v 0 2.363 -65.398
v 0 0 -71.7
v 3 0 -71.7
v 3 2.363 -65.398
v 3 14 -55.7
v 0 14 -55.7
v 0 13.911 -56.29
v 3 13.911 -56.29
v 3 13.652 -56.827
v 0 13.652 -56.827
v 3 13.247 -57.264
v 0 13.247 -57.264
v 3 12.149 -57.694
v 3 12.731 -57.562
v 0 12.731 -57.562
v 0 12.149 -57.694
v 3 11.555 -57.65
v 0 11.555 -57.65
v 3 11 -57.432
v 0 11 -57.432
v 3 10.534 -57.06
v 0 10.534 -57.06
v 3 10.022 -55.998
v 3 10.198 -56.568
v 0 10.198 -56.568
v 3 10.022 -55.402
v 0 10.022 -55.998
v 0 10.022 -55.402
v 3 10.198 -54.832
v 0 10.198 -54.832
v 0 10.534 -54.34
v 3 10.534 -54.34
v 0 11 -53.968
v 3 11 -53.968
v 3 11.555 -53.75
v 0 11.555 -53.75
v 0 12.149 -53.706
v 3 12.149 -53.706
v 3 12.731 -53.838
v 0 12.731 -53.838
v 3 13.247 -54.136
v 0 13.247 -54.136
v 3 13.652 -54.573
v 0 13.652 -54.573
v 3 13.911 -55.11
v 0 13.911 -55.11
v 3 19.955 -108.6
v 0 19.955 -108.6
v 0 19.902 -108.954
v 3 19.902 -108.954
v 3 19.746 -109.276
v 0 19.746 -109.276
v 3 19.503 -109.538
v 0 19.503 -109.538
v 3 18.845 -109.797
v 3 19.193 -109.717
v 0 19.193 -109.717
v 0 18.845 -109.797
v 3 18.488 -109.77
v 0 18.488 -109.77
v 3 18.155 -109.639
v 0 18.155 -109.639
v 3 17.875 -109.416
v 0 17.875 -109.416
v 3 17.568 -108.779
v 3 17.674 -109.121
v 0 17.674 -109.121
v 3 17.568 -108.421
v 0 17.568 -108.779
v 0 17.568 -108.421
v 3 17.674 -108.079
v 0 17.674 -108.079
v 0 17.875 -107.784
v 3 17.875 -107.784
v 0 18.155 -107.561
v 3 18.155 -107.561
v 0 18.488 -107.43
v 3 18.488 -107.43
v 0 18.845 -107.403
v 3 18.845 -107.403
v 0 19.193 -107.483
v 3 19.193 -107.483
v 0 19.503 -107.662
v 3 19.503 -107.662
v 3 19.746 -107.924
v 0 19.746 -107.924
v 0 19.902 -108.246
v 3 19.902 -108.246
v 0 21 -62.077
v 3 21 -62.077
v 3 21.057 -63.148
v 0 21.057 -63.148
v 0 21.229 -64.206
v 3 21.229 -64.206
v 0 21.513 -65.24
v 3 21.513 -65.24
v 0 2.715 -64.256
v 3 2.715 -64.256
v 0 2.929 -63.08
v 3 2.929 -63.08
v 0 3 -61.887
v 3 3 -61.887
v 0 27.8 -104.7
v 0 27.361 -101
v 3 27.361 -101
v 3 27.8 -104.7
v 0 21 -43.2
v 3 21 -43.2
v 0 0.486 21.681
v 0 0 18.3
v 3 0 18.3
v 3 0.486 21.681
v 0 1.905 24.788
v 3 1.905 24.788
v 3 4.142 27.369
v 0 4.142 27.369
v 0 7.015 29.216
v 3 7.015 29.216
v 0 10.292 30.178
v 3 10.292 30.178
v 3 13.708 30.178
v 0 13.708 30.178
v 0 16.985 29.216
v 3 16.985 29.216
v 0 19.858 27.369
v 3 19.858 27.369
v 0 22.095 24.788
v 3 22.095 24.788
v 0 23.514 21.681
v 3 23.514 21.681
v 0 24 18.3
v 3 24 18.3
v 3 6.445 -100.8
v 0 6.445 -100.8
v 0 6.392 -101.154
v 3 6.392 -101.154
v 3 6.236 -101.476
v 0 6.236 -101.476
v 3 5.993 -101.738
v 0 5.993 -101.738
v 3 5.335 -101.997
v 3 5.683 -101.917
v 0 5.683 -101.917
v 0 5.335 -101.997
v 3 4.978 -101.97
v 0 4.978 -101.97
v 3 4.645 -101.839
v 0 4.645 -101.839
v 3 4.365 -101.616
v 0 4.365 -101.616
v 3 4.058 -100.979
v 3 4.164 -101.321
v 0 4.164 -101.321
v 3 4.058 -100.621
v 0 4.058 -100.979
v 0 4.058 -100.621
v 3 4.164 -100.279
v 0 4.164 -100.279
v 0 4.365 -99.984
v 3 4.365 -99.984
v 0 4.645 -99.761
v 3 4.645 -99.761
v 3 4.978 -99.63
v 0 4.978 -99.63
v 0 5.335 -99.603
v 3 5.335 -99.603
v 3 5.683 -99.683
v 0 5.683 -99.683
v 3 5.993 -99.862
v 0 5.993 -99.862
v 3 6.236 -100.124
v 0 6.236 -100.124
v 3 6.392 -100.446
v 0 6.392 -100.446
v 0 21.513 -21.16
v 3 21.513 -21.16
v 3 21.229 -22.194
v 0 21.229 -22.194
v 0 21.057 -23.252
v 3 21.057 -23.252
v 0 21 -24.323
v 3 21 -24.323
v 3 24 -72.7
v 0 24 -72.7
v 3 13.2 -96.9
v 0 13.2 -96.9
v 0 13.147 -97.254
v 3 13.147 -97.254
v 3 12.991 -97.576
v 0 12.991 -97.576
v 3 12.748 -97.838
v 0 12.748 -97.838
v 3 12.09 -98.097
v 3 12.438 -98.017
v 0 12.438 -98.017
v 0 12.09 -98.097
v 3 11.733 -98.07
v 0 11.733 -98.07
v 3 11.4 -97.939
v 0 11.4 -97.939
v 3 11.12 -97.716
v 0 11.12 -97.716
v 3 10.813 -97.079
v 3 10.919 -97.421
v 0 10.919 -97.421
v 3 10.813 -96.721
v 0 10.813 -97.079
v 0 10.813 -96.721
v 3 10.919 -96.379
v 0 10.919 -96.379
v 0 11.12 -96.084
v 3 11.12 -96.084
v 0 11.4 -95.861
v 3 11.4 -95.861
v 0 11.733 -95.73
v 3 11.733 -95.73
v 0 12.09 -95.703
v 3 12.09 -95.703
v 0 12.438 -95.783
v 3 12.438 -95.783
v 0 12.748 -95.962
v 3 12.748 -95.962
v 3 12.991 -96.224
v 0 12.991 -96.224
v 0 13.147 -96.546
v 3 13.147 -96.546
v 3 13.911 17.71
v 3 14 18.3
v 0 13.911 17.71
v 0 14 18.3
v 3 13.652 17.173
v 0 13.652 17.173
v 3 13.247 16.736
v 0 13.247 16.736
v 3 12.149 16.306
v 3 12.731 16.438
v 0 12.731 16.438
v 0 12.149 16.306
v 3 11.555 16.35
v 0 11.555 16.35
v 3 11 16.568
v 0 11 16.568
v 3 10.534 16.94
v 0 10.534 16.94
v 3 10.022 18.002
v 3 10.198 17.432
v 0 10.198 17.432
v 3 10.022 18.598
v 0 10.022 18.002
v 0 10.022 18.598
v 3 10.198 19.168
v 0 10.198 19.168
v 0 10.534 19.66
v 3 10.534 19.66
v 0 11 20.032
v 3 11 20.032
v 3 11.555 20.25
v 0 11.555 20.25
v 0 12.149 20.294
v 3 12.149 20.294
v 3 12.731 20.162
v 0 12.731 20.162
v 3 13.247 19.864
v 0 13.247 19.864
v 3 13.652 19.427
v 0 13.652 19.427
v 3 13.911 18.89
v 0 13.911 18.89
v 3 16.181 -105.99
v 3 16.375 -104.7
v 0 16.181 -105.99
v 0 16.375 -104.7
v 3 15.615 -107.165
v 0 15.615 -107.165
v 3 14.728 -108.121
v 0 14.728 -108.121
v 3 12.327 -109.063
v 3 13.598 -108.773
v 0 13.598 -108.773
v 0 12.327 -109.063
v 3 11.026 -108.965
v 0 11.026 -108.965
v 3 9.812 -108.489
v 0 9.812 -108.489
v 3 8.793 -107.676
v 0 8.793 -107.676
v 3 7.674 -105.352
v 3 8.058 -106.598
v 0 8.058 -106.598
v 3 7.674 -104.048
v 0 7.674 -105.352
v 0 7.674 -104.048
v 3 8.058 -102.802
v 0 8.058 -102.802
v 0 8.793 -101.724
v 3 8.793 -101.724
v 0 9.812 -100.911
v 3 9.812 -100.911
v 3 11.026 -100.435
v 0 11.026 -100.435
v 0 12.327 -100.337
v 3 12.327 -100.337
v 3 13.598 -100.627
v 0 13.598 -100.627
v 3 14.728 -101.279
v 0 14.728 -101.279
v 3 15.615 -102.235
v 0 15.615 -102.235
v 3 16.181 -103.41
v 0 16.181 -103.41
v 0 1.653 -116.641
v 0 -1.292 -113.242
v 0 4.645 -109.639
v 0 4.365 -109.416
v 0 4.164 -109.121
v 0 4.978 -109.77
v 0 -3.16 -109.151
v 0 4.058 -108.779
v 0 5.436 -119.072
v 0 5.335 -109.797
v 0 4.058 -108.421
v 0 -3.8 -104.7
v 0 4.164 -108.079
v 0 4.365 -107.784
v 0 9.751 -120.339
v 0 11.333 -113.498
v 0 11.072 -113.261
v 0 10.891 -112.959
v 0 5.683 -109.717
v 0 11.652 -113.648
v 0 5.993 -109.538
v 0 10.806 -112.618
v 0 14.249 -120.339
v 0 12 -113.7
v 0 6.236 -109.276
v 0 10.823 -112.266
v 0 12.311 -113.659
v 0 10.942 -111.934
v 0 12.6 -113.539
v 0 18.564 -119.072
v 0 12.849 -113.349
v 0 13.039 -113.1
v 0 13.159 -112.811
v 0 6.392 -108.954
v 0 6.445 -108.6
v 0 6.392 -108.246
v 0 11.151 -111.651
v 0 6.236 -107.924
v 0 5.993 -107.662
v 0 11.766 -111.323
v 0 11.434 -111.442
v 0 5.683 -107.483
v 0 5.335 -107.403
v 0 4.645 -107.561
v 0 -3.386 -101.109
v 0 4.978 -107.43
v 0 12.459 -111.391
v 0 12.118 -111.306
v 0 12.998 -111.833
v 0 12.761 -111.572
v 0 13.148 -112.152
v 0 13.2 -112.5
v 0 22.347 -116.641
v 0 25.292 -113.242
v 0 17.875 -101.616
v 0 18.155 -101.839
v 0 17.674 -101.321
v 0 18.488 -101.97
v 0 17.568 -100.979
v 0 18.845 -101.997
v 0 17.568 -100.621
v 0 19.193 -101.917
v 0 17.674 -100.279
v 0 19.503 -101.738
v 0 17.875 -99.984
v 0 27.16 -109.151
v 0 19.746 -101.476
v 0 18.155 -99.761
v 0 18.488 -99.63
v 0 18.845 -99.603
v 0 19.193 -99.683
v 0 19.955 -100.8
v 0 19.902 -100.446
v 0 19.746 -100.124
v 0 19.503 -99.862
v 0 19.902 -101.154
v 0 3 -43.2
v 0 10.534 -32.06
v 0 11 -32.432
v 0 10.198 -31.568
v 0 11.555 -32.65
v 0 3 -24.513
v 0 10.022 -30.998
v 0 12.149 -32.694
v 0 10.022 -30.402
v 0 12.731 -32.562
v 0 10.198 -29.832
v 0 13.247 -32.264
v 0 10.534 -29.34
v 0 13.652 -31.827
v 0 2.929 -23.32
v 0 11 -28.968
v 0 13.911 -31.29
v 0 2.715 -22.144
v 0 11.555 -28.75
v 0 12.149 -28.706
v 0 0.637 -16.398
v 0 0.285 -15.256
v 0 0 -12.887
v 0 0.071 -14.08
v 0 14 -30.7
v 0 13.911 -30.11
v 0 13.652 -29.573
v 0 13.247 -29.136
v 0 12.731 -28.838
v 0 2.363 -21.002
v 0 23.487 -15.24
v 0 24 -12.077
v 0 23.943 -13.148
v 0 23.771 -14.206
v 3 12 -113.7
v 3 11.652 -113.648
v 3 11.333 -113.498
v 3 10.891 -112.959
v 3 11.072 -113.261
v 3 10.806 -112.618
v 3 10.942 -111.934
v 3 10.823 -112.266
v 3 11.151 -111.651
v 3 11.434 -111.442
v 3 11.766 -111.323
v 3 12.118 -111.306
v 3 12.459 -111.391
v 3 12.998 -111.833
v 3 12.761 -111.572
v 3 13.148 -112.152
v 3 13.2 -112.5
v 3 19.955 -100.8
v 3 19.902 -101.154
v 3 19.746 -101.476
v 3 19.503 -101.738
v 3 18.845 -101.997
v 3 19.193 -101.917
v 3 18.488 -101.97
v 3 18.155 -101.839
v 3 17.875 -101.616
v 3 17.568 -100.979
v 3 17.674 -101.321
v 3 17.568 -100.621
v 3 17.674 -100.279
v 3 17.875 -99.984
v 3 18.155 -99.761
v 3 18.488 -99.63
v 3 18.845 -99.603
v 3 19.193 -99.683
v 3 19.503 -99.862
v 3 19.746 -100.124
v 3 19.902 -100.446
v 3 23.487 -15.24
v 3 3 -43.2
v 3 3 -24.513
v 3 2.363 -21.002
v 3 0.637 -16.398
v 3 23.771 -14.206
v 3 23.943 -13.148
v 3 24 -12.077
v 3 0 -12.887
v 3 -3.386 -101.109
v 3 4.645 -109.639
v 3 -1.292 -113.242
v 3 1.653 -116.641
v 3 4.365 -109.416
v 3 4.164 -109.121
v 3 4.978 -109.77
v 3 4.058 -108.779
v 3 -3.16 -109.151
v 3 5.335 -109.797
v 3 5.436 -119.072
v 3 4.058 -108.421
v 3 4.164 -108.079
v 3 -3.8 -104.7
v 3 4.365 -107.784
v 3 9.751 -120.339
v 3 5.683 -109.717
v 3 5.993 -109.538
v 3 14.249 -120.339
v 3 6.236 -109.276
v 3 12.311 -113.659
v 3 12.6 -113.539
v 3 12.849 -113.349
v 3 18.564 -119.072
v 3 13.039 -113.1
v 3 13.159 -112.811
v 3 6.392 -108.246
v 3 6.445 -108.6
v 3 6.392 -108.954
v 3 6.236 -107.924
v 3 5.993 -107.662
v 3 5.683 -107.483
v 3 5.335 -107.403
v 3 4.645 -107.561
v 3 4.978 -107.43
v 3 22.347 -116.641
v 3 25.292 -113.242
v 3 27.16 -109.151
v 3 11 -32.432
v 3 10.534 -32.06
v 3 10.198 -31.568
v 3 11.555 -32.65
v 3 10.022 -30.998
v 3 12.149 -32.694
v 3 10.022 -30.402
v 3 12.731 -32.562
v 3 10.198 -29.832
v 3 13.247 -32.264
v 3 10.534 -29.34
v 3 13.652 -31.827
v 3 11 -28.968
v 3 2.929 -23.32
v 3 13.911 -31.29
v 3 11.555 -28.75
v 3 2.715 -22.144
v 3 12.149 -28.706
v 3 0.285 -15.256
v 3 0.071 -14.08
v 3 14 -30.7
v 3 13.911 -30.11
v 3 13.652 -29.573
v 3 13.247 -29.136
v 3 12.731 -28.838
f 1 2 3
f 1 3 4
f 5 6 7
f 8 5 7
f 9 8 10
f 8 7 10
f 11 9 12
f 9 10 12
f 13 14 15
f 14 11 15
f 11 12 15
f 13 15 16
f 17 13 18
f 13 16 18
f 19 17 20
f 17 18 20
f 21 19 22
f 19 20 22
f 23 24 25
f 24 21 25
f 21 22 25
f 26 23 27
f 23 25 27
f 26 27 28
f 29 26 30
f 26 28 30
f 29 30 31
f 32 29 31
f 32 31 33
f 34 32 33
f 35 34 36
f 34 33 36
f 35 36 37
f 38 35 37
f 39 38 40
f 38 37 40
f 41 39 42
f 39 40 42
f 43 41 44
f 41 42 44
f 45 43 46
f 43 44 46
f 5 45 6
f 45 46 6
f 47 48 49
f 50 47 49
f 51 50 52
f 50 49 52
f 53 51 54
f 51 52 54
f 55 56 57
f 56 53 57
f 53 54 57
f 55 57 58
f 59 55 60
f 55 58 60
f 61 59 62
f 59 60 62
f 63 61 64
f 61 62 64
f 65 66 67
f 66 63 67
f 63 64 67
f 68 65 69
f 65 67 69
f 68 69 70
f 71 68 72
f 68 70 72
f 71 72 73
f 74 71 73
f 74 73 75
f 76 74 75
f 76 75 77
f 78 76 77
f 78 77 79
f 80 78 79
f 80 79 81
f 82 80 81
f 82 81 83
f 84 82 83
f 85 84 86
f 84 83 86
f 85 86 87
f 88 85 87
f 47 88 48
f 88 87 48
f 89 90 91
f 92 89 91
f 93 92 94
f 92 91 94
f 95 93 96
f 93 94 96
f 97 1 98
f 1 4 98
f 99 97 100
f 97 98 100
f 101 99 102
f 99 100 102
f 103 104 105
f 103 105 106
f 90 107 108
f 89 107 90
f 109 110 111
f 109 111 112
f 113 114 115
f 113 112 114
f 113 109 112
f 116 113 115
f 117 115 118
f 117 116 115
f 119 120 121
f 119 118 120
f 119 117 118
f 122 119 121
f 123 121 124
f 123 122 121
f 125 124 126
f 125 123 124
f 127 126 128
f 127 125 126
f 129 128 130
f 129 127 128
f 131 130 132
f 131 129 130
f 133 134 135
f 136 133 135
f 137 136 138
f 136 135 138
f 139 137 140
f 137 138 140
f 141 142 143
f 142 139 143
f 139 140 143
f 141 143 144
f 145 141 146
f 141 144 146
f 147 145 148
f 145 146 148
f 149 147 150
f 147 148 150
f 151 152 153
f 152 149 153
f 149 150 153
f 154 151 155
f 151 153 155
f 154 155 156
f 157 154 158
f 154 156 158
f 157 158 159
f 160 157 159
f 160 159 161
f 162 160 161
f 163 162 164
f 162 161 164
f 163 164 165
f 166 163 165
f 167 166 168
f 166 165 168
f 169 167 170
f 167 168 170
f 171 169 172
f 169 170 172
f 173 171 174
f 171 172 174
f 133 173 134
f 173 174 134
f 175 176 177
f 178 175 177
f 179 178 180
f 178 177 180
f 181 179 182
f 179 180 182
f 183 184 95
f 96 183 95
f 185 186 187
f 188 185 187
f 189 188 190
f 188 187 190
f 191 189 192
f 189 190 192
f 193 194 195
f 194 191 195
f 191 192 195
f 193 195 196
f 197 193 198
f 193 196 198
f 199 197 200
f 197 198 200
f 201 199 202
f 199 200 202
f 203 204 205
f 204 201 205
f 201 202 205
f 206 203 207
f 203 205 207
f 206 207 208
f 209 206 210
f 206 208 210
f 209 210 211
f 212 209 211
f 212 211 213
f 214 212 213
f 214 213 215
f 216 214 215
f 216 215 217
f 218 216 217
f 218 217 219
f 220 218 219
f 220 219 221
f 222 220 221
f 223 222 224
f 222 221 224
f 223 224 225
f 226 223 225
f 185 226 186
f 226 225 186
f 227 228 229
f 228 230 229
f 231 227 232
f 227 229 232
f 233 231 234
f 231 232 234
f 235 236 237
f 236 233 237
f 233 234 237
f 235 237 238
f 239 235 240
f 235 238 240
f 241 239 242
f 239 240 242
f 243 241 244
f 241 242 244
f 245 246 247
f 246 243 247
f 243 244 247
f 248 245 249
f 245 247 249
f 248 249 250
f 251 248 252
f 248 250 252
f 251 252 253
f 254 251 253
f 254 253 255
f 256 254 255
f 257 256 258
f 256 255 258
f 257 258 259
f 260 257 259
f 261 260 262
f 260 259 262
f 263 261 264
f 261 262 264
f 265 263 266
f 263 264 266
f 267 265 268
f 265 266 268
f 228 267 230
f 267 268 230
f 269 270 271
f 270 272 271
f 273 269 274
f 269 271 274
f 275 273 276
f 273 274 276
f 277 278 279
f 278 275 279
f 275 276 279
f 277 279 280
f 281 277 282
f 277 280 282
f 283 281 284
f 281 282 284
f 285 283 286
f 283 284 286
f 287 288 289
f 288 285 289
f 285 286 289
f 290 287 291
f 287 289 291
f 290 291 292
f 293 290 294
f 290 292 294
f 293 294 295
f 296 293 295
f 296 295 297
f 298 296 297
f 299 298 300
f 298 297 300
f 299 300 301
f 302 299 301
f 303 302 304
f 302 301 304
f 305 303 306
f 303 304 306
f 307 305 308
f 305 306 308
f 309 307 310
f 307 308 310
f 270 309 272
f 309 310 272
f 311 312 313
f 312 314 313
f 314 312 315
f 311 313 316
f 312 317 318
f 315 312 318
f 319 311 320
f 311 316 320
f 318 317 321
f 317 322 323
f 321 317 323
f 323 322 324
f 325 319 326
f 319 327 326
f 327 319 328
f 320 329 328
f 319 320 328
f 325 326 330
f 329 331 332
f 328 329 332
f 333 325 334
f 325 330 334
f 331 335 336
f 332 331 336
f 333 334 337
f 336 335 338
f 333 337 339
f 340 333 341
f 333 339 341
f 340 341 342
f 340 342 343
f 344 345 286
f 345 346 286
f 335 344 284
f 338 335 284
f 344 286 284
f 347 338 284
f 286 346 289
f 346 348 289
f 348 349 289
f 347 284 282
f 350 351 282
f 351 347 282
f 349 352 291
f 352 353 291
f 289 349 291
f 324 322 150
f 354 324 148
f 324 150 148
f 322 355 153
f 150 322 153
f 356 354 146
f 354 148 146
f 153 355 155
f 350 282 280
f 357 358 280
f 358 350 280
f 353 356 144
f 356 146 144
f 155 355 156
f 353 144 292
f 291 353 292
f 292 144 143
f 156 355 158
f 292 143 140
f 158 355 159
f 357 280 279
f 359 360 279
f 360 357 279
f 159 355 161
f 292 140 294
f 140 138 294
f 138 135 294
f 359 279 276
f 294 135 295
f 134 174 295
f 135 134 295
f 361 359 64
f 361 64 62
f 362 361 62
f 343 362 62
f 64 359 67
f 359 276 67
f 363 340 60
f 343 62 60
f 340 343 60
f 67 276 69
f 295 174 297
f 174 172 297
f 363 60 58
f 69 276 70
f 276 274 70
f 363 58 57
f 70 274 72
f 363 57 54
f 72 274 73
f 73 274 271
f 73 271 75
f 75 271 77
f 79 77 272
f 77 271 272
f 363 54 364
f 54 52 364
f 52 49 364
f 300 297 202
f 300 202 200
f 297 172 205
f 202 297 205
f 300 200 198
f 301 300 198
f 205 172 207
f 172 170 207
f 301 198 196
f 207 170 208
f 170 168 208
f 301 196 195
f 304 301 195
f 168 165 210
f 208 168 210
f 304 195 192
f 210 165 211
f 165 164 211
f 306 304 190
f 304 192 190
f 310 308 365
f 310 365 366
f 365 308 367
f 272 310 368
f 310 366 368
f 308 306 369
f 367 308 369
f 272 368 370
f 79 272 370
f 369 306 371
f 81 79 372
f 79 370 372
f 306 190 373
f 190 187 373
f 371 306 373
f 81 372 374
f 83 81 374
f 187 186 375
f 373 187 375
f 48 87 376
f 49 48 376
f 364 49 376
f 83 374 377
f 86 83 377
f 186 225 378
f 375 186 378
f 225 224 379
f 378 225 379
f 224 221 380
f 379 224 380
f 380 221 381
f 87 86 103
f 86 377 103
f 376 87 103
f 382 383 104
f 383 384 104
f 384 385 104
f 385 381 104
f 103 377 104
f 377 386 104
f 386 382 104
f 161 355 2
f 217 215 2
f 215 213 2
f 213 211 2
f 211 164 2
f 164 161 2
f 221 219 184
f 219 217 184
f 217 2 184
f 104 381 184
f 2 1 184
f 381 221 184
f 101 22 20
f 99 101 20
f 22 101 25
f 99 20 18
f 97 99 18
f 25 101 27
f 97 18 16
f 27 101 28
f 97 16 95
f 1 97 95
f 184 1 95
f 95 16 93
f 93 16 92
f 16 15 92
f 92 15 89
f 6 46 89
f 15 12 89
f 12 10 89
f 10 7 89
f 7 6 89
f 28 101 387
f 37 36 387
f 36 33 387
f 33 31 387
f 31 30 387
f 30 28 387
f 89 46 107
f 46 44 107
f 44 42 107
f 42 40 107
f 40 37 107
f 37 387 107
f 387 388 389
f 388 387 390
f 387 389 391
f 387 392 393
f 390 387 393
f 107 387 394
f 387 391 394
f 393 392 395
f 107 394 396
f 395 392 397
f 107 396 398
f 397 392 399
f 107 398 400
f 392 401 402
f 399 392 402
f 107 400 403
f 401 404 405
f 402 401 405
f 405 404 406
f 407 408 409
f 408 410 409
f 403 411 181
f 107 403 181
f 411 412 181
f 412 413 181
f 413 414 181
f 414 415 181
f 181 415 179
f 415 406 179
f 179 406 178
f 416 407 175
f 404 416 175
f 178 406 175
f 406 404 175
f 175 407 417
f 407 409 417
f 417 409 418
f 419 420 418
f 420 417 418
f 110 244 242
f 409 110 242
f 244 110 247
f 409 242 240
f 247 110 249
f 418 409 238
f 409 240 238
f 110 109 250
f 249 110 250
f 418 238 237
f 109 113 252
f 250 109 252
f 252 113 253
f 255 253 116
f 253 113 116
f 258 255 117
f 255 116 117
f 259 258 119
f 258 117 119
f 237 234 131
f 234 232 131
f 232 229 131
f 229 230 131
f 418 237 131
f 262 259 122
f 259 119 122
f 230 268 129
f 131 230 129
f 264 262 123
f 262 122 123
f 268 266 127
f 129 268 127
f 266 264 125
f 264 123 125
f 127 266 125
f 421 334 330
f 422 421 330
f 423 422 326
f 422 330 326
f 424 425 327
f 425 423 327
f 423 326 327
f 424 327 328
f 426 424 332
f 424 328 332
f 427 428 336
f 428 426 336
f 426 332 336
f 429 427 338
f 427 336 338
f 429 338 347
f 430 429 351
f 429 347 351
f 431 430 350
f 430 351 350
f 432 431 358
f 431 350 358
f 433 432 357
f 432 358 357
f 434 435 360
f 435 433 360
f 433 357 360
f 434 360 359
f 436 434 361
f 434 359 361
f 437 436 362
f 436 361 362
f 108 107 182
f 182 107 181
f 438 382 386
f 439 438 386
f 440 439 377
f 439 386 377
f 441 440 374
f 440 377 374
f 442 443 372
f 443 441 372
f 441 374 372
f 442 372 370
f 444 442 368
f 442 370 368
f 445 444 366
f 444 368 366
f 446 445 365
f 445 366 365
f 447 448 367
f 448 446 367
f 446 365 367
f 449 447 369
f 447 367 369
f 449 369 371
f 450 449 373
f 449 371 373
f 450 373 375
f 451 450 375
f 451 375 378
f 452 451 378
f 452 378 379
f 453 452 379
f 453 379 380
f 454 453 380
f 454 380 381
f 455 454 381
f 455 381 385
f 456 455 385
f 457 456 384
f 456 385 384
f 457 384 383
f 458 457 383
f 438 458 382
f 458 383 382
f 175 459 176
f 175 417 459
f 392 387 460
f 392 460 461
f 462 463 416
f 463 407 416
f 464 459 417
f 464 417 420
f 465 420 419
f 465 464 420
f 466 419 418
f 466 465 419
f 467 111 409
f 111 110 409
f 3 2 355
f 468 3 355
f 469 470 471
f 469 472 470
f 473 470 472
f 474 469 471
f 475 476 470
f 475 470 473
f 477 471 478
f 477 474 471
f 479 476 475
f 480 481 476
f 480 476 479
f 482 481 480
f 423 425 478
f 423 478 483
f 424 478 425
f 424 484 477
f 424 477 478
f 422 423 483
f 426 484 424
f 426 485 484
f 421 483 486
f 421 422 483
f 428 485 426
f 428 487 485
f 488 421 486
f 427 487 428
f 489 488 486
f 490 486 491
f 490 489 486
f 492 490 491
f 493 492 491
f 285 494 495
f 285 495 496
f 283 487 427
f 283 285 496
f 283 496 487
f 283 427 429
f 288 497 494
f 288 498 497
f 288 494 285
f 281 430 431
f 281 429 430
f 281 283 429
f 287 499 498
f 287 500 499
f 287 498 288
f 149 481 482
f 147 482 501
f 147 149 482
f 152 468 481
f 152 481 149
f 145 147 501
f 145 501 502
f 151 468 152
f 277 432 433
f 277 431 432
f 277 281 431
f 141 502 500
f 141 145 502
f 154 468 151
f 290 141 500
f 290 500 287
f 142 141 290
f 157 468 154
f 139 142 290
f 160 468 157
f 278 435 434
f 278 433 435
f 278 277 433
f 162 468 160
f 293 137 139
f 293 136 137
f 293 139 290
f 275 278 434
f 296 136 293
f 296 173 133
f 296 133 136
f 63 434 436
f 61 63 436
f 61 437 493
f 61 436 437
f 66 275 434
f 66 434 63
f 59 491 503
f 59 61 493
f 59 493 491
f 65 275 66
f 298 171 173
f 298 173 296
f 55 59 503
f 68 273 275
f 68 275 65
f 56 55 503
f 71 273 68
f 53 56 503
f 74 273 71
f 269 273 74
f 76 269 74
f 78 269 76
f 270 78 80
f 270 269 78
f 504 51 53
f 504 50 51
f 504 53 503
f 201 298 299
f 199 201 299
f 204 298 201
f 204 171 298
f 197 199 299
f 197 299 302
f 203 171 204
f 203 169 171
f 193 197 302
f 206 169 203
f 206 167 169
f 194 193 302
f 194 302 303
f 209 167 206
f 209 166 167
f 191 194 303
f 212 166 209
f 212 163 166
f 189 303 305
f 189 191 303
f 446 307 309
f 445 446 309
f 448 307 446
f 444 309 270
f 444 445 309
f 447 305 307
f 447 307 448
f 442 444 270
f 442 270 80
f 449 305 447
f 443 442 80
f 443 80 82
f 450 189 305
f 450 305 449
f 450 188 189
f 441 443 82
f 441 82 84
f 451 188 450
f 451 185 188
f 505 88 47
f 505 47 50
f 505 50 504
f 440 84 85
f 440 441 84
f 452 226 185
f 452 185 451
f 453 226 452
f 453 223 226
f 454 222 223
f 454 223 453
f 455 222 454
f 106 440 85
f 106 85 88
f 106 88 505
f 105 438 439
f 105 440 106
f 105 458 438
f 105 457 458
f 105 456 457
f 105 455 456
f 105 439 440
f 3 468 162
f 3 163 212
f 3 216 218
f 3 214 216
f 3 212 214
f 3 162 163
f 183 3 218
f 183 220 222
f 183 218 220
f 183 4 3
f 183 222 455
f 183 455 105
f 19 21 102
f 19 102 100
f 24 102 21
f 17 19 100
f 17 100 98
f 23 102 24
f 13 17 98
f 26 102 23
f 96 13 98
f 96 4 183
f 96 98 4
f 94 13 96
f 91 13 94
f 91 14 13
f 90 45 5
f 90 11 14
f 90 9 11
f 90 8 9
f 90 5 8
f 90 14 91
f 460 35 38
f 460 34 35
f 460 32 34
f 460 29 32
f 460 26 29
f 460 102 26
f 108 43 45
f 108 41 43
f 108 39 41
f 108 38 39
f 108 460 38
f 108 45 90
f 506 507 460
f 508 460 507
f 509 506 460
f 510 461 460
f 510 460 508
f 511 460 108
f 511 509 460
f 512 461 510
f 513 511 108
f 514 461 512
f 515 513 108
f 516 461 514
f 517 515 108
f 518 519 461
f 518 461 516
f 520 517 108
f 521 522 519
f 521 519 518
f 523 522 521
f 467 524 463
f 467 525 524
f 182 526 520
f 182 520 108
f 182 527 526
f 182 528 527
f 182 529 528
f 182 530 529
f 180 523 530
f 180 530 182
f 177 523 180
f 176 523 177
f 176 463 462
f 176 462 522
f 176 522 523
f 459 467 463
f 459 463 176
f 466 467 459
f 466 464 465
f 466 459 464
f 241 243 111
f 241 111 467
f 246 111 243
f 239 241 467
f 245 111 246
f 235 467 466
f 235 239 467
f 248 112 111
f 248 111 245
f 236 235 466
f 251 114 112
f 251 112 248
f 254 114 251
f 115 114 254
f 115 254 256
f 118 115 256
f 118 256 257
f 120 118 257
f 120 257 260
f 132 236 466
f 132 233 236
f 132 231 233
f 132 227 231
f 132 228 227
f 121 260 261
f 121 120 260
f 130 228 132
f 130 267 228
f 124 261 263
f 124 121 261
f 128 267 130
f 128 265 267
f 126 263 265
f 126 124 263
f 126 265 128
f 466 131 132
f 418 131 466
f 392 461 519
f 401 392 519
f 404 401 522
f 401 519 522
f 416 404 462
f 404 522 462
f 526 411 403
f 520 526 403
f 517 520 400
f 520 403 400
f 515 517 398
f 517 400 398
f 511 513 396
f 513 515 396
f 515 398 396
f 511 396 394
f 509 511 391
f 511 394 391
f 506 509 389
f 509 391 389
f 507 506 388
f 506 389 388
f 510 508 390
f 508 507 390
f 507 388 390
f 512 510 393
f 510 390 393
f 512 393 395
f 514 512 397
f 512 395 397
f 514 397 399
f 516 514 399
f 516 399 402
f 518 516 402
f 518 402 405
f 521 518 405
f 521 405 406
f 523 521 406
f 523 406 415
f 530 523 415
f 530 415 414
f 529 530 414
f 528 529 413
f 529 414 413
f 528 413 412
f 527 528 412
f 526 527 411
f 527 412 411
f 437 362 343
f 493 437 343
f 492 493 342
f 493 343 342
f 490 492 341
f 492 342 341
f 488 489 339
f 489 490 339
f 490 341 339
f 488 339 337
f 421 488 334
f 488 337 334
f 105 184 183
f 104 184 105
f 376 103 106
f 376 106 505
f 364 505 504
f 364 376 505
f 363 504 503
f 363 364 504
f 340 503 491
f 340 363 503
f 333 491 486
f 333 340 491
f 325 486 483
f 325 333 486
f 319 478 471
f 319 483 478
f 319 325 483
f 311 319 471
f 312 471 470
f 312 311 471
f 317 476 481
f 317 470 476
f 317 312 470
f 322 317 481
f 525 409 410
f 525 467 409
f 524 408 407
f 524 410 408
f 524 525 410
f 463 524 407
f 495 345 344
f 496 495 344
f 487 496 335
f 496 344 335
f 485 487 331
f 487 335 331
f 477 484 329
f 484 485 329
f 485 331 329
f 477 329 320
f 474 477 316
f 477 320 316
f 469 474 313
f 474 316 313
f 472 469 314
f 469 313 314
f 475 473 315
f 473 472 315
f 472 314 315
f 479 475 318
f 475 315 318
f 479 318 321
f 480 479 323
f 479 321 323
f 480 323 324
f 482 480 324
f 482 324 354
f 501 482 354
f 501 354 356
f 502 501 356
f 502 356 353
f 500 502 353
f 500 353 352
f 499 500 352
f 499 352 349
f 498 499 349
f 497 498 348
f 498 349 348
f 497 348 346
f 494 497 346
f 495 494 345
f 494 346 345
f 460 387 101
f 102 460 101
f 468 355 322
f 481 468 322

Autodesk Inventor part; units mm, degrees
ref_plane "YZ Plane" through (0, 0, 0) normal (1, 0, 0) x (0, 1, 0)
ref_plane "XZ Plane" through (0, 0, 0) normal (0, 1, 0) x (-1, 0, 0)
ref_plane "XY Plane" through (0, 0, 0) normal (0, 0, 1) x (1, 0, 0)
sketch "Sketch1" plane through (0, 0, 0) normal (1, 0, 0) x (0, 1, 0)
  circle A0 centre (12, -104.7) radius 4.375
  circle A1 centre (12, -104.7) radius 9 construction
  line L0 (12, -116.7) -> (12, -104.7) construction
  line L1 (12, -113.7) -> (12, -112.5)
  circle A2 centre (12, -112.5) radius 1.2
  circle A3 centre (12, -55.7) radius 2
  circle A4 centre (18.755, -108.6) radius 1.2
  circle A5 centre (18.755, -100.8) radius 1.2
  circle A6 centre (12, -96.9) radius 1.2
  circle A7 centre (5.245, -100.8) radius 1.2
  circle A8 centre (5.245, -108.6) radius 1.2
  line L2 (3, -43.2) -> (21, -43.2) construction
  line L3 (12, -116.7) -> (12, -71.7) construction
  line L4 (12, -71.7) -> (12, -63.7) construction
  line L5 (12, -63.7) -> (21, -63.7) construction
  line L6 (12, -63.7) -> (3, -63.7) construction
  line L7 (24, -72.7) -> (21, -63.7)
  line L8 (0, -71.7) -> (3, -63.7)
  line L9 (3, -43.2) -> (3, -63.7)
  line L10 (21, -43.2) -> (21, -63.7)
  arc A9 (24, 18.3) -> (0, 18.3) centre (12, 18.3) ccw
  circle A10 centre (12, -30.7) radius 2
  line L11 (12, -14.7) -> (12, -22.7) construction
  line L12 (12, -22.7) -> (21, -22.7) construction
  line L13 (12, -22.7) -> (3, -22.7) construction
  line L14 (24, -13.7) -> (21, -22.7)
  line L15 (0, -14.7) -> (3, -22.7)
  line L16 (3, -43.2) -> (3, -22.7)
  line L17 (0, 18.3) -> (0, -14.7)
  line L18 (24, 18.3) -> (24, -13.7)
  line L19 (21, -43.2) -> (21, -22.7)
  arc A11 (-3.3865, -101.1088) -> (27.3606, -100.9997) centre (12, -104.7) ccw
  line L20 (24, -72.7) -> (27.8, -104.7)
  line L21 (0, -71.7) -> (-3.8, -104.7)
  circle A12 centre (12, 18.3) radius 2
  point P0 (1.5, 26.1095)
  point P1 (22.5, 26.1095)
  point P2 (19.7942, -109.2)
  point P3 (19.7942, -100.2)
  point P4 (12, -95.7)
  point P5 (4.2058, -100.2)
  point P6 (4.2058, -109.2)
  dimension "d7" = 18
  dimension "d6" = 8.75
  dimension "d8" = 1.2
  dimension "d12" = 4
  dimension "d15" = 360
  dimension "d22" = 45
  dimension "d23" = 8
  dimension "d24" = 9
  dimension "d25" = 9
  dimension "d33" = 8
  dimension "d34" = 12.5
  dimension "d45" = 4
  dimension "d46" = 4
extrude "Extrusion2" add sketch "Sketch1" along normal blind 3 contours L20 A11 L21 L8 L9 L16 L15 L17 A9 L18 L14 L19 L10 L7
fillet "Face Fillet1" radius 10 1 edges at (1.5, 3, -22.7)
fillet "Face Fillet2" radius 10 1 edges at (1.5, 0, -14.7)
fillet "Face Fillet3" radius 10 1 edges at (1.5, 3, -63.7)
fillet "Face Fillet5" radius 10 1 edges at (1.5, 24, -13.7)
fillet "Face Fillet6" radius 10 1 edges at (1.5, 21, -22.7)
fillet "Face Fillet7" radius 10 1 edges at (1.5, 21, -63.7)
properties part number "Brazo1.1"
